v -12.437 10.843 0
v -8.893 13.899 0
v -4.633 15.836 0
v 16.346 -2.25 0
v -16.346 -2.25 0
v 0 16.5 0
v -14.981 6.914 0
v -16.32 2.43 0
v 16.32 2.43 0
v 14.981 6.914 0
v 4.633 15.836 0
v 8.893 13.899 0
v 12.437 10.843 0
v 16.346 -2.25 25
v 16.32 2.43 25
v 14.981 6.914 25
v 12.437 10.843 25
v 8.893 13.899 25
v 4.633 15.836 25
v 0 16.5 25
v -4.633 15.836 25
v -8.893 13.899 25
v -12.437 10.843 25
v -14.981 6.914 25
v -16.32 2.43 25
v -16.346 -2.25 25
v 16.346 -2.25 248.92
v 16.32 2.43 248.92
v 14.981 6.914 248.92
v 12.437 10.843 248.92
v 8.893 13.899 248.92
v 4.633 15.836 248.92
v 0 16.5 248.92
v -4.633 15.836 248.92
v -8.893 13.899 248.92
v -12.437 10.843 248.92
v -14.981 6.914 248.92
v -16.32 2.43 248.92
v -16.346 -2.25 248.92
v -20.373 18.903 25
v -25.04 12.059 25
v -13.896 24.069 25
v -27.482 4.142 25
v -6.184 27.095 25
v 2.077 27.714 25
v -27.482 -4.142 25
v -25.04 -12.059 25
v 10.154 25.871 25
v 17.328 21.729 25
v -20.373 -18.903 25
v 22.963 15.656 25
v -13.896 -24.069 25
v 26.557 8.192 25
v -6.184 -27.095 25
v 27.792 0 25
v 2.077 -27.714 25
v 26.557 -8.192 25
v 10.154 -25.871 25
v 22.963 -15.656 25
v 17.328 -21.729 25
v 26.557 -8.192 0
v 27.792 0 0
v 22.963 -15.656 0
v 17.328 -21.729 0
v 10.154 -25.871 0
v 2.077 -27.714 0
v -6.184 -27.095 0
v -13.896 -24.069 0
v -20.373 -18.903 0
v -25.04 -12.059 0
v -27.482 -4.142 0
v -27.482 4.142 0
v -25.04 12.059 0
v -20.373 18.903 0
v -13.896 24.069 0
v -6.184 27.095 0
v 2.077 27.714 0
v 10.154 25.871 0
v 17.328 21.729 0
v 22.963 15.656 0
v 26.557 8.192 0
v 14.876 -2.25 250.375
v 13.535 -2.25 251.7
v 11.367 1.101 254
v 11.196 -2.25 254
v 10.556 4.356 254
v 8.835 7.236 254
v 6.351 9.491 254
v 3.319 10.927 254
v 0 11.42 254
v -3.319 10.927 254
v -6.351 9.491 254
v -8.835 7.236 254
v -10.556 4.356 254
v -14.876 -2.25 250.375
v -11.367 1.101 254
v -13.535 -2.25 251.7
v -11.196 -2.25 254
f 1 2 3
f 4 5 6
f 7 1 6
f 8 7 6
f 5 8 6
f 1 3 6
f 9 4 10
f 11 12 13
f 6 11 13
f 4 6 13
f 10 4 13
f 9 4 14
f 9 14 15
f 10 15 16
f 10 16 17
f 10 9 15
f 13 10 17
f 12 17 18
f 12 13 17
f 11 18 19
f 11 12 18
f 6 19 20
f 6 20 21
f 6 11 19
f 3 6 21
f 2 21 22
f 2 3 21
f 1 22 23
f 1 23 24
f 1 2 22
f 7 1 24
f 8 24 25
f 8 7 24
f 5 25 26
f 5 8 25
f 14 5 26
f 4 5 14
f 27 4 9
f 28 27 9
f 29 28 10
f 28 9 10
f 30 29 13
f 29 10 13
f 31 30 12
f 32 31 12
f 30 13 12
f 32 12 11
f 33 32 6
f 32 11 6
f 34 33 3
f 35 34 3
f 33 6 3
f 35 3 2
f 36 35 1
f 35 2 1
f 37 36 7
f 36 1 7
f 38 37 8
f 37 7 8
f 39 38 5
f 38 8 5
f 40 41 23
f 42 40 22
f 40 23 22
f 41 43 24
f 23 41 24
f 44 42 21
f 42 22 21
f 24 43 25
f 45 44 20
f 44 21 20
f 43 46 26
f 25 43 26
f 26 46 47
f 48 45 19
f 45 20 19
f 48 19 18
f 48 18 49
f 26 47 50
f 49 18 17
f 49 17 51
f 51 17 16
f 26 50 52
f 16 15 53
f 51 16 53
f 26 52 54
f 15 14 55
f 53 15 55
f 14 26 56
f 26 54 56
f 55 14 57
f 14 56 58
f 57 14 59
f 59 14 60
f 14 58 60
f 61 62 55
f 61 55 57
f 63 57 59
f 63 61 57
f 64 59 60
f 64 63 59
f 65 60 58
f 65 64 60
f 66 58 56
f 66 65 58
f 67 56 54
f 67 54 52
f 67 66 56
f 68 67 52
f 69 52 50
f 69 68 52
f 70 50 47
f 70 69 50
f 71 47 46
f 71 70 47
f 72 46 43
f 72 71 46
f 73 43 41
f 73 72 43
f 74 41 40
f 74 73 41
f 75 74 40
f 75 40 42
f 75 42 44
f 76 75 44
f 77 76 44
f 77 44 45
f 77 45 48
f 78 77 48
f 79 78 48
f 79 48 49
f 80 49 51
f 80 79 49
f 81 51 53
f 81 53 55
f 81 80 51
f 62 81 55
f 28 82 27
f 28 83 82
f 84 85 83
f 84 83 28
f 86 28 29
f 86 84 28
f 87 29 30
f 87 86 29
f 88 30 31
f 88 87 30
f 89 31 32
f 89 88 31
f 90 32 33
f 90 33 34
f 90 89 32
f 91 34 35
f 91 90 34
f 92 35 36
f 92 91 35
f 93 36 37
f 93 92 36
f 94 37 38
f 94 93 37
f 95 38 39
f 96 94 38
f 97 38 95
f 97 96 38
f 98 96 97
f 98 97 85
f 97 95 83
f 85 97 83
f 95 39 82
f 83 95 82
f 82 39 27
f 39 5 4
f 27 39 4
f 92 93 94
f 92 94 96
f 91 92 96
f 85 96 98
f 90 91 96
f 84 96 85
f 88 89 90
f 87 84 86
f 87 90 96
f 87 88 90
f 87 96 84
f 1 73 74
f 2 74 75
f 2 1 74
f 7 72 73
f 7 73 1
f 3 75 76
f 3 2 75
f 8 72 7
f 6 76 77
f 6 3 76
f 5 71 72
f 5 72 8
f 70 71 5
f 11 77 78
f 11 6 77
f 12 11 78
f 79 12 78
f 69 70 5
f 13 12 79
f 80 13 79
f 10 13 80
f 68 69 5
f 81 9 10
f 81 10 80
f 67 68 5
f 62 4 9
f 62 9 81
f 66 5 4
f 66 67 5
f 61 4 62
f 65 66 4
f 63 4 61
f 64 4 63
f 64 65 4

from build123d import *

# Parameters (mm, degrees)
F1_DEPTH = 254
F2_SIZE  = 5.08
F3_R     = 27.792058
F4_DEPTH = 25


with BuildPart() as f1:
    # F0 (on Top) → F1 (new body)
    with BuildSketch(Plane.XY):
        with BuildLine():
            Line((-16.345871, -2.25), (16.345871, -2.25))
            ThreePointArc((16.345871, -2.25), (0, 16.5), (-16.345871, -2.25))
        make_face()
    extrude(amount=F1_DEPTH)

    # F2
    f2_edges = [f1.edges().sort_by_distance(p)[0] for p in [
        (0, 16.5, 254),
    ]]
    chamfer(f2_edges, length=F2_SIZE)


with BuildPart() as f4:
    # F3 (on face) → F4 (new body)
    with BuildSketch(Plane(origin=(0, 0, 0), x_dir=(1, 0, 0), z_dir=(0, 0, -1))):
        Circle(F3_R)
        with BuildLine():
            Line((-16.345871, 2.25), (16.345871, 2.25))
            ThreePointArc((16.345871, 2.25), (0, -16.5), (-16.345871, 2.25))
        make_face(mode=Mode.SUBTRACT)
    extrude(amount=-F4_DEPTH)


solid = Compound([f1.part, f4.part])
